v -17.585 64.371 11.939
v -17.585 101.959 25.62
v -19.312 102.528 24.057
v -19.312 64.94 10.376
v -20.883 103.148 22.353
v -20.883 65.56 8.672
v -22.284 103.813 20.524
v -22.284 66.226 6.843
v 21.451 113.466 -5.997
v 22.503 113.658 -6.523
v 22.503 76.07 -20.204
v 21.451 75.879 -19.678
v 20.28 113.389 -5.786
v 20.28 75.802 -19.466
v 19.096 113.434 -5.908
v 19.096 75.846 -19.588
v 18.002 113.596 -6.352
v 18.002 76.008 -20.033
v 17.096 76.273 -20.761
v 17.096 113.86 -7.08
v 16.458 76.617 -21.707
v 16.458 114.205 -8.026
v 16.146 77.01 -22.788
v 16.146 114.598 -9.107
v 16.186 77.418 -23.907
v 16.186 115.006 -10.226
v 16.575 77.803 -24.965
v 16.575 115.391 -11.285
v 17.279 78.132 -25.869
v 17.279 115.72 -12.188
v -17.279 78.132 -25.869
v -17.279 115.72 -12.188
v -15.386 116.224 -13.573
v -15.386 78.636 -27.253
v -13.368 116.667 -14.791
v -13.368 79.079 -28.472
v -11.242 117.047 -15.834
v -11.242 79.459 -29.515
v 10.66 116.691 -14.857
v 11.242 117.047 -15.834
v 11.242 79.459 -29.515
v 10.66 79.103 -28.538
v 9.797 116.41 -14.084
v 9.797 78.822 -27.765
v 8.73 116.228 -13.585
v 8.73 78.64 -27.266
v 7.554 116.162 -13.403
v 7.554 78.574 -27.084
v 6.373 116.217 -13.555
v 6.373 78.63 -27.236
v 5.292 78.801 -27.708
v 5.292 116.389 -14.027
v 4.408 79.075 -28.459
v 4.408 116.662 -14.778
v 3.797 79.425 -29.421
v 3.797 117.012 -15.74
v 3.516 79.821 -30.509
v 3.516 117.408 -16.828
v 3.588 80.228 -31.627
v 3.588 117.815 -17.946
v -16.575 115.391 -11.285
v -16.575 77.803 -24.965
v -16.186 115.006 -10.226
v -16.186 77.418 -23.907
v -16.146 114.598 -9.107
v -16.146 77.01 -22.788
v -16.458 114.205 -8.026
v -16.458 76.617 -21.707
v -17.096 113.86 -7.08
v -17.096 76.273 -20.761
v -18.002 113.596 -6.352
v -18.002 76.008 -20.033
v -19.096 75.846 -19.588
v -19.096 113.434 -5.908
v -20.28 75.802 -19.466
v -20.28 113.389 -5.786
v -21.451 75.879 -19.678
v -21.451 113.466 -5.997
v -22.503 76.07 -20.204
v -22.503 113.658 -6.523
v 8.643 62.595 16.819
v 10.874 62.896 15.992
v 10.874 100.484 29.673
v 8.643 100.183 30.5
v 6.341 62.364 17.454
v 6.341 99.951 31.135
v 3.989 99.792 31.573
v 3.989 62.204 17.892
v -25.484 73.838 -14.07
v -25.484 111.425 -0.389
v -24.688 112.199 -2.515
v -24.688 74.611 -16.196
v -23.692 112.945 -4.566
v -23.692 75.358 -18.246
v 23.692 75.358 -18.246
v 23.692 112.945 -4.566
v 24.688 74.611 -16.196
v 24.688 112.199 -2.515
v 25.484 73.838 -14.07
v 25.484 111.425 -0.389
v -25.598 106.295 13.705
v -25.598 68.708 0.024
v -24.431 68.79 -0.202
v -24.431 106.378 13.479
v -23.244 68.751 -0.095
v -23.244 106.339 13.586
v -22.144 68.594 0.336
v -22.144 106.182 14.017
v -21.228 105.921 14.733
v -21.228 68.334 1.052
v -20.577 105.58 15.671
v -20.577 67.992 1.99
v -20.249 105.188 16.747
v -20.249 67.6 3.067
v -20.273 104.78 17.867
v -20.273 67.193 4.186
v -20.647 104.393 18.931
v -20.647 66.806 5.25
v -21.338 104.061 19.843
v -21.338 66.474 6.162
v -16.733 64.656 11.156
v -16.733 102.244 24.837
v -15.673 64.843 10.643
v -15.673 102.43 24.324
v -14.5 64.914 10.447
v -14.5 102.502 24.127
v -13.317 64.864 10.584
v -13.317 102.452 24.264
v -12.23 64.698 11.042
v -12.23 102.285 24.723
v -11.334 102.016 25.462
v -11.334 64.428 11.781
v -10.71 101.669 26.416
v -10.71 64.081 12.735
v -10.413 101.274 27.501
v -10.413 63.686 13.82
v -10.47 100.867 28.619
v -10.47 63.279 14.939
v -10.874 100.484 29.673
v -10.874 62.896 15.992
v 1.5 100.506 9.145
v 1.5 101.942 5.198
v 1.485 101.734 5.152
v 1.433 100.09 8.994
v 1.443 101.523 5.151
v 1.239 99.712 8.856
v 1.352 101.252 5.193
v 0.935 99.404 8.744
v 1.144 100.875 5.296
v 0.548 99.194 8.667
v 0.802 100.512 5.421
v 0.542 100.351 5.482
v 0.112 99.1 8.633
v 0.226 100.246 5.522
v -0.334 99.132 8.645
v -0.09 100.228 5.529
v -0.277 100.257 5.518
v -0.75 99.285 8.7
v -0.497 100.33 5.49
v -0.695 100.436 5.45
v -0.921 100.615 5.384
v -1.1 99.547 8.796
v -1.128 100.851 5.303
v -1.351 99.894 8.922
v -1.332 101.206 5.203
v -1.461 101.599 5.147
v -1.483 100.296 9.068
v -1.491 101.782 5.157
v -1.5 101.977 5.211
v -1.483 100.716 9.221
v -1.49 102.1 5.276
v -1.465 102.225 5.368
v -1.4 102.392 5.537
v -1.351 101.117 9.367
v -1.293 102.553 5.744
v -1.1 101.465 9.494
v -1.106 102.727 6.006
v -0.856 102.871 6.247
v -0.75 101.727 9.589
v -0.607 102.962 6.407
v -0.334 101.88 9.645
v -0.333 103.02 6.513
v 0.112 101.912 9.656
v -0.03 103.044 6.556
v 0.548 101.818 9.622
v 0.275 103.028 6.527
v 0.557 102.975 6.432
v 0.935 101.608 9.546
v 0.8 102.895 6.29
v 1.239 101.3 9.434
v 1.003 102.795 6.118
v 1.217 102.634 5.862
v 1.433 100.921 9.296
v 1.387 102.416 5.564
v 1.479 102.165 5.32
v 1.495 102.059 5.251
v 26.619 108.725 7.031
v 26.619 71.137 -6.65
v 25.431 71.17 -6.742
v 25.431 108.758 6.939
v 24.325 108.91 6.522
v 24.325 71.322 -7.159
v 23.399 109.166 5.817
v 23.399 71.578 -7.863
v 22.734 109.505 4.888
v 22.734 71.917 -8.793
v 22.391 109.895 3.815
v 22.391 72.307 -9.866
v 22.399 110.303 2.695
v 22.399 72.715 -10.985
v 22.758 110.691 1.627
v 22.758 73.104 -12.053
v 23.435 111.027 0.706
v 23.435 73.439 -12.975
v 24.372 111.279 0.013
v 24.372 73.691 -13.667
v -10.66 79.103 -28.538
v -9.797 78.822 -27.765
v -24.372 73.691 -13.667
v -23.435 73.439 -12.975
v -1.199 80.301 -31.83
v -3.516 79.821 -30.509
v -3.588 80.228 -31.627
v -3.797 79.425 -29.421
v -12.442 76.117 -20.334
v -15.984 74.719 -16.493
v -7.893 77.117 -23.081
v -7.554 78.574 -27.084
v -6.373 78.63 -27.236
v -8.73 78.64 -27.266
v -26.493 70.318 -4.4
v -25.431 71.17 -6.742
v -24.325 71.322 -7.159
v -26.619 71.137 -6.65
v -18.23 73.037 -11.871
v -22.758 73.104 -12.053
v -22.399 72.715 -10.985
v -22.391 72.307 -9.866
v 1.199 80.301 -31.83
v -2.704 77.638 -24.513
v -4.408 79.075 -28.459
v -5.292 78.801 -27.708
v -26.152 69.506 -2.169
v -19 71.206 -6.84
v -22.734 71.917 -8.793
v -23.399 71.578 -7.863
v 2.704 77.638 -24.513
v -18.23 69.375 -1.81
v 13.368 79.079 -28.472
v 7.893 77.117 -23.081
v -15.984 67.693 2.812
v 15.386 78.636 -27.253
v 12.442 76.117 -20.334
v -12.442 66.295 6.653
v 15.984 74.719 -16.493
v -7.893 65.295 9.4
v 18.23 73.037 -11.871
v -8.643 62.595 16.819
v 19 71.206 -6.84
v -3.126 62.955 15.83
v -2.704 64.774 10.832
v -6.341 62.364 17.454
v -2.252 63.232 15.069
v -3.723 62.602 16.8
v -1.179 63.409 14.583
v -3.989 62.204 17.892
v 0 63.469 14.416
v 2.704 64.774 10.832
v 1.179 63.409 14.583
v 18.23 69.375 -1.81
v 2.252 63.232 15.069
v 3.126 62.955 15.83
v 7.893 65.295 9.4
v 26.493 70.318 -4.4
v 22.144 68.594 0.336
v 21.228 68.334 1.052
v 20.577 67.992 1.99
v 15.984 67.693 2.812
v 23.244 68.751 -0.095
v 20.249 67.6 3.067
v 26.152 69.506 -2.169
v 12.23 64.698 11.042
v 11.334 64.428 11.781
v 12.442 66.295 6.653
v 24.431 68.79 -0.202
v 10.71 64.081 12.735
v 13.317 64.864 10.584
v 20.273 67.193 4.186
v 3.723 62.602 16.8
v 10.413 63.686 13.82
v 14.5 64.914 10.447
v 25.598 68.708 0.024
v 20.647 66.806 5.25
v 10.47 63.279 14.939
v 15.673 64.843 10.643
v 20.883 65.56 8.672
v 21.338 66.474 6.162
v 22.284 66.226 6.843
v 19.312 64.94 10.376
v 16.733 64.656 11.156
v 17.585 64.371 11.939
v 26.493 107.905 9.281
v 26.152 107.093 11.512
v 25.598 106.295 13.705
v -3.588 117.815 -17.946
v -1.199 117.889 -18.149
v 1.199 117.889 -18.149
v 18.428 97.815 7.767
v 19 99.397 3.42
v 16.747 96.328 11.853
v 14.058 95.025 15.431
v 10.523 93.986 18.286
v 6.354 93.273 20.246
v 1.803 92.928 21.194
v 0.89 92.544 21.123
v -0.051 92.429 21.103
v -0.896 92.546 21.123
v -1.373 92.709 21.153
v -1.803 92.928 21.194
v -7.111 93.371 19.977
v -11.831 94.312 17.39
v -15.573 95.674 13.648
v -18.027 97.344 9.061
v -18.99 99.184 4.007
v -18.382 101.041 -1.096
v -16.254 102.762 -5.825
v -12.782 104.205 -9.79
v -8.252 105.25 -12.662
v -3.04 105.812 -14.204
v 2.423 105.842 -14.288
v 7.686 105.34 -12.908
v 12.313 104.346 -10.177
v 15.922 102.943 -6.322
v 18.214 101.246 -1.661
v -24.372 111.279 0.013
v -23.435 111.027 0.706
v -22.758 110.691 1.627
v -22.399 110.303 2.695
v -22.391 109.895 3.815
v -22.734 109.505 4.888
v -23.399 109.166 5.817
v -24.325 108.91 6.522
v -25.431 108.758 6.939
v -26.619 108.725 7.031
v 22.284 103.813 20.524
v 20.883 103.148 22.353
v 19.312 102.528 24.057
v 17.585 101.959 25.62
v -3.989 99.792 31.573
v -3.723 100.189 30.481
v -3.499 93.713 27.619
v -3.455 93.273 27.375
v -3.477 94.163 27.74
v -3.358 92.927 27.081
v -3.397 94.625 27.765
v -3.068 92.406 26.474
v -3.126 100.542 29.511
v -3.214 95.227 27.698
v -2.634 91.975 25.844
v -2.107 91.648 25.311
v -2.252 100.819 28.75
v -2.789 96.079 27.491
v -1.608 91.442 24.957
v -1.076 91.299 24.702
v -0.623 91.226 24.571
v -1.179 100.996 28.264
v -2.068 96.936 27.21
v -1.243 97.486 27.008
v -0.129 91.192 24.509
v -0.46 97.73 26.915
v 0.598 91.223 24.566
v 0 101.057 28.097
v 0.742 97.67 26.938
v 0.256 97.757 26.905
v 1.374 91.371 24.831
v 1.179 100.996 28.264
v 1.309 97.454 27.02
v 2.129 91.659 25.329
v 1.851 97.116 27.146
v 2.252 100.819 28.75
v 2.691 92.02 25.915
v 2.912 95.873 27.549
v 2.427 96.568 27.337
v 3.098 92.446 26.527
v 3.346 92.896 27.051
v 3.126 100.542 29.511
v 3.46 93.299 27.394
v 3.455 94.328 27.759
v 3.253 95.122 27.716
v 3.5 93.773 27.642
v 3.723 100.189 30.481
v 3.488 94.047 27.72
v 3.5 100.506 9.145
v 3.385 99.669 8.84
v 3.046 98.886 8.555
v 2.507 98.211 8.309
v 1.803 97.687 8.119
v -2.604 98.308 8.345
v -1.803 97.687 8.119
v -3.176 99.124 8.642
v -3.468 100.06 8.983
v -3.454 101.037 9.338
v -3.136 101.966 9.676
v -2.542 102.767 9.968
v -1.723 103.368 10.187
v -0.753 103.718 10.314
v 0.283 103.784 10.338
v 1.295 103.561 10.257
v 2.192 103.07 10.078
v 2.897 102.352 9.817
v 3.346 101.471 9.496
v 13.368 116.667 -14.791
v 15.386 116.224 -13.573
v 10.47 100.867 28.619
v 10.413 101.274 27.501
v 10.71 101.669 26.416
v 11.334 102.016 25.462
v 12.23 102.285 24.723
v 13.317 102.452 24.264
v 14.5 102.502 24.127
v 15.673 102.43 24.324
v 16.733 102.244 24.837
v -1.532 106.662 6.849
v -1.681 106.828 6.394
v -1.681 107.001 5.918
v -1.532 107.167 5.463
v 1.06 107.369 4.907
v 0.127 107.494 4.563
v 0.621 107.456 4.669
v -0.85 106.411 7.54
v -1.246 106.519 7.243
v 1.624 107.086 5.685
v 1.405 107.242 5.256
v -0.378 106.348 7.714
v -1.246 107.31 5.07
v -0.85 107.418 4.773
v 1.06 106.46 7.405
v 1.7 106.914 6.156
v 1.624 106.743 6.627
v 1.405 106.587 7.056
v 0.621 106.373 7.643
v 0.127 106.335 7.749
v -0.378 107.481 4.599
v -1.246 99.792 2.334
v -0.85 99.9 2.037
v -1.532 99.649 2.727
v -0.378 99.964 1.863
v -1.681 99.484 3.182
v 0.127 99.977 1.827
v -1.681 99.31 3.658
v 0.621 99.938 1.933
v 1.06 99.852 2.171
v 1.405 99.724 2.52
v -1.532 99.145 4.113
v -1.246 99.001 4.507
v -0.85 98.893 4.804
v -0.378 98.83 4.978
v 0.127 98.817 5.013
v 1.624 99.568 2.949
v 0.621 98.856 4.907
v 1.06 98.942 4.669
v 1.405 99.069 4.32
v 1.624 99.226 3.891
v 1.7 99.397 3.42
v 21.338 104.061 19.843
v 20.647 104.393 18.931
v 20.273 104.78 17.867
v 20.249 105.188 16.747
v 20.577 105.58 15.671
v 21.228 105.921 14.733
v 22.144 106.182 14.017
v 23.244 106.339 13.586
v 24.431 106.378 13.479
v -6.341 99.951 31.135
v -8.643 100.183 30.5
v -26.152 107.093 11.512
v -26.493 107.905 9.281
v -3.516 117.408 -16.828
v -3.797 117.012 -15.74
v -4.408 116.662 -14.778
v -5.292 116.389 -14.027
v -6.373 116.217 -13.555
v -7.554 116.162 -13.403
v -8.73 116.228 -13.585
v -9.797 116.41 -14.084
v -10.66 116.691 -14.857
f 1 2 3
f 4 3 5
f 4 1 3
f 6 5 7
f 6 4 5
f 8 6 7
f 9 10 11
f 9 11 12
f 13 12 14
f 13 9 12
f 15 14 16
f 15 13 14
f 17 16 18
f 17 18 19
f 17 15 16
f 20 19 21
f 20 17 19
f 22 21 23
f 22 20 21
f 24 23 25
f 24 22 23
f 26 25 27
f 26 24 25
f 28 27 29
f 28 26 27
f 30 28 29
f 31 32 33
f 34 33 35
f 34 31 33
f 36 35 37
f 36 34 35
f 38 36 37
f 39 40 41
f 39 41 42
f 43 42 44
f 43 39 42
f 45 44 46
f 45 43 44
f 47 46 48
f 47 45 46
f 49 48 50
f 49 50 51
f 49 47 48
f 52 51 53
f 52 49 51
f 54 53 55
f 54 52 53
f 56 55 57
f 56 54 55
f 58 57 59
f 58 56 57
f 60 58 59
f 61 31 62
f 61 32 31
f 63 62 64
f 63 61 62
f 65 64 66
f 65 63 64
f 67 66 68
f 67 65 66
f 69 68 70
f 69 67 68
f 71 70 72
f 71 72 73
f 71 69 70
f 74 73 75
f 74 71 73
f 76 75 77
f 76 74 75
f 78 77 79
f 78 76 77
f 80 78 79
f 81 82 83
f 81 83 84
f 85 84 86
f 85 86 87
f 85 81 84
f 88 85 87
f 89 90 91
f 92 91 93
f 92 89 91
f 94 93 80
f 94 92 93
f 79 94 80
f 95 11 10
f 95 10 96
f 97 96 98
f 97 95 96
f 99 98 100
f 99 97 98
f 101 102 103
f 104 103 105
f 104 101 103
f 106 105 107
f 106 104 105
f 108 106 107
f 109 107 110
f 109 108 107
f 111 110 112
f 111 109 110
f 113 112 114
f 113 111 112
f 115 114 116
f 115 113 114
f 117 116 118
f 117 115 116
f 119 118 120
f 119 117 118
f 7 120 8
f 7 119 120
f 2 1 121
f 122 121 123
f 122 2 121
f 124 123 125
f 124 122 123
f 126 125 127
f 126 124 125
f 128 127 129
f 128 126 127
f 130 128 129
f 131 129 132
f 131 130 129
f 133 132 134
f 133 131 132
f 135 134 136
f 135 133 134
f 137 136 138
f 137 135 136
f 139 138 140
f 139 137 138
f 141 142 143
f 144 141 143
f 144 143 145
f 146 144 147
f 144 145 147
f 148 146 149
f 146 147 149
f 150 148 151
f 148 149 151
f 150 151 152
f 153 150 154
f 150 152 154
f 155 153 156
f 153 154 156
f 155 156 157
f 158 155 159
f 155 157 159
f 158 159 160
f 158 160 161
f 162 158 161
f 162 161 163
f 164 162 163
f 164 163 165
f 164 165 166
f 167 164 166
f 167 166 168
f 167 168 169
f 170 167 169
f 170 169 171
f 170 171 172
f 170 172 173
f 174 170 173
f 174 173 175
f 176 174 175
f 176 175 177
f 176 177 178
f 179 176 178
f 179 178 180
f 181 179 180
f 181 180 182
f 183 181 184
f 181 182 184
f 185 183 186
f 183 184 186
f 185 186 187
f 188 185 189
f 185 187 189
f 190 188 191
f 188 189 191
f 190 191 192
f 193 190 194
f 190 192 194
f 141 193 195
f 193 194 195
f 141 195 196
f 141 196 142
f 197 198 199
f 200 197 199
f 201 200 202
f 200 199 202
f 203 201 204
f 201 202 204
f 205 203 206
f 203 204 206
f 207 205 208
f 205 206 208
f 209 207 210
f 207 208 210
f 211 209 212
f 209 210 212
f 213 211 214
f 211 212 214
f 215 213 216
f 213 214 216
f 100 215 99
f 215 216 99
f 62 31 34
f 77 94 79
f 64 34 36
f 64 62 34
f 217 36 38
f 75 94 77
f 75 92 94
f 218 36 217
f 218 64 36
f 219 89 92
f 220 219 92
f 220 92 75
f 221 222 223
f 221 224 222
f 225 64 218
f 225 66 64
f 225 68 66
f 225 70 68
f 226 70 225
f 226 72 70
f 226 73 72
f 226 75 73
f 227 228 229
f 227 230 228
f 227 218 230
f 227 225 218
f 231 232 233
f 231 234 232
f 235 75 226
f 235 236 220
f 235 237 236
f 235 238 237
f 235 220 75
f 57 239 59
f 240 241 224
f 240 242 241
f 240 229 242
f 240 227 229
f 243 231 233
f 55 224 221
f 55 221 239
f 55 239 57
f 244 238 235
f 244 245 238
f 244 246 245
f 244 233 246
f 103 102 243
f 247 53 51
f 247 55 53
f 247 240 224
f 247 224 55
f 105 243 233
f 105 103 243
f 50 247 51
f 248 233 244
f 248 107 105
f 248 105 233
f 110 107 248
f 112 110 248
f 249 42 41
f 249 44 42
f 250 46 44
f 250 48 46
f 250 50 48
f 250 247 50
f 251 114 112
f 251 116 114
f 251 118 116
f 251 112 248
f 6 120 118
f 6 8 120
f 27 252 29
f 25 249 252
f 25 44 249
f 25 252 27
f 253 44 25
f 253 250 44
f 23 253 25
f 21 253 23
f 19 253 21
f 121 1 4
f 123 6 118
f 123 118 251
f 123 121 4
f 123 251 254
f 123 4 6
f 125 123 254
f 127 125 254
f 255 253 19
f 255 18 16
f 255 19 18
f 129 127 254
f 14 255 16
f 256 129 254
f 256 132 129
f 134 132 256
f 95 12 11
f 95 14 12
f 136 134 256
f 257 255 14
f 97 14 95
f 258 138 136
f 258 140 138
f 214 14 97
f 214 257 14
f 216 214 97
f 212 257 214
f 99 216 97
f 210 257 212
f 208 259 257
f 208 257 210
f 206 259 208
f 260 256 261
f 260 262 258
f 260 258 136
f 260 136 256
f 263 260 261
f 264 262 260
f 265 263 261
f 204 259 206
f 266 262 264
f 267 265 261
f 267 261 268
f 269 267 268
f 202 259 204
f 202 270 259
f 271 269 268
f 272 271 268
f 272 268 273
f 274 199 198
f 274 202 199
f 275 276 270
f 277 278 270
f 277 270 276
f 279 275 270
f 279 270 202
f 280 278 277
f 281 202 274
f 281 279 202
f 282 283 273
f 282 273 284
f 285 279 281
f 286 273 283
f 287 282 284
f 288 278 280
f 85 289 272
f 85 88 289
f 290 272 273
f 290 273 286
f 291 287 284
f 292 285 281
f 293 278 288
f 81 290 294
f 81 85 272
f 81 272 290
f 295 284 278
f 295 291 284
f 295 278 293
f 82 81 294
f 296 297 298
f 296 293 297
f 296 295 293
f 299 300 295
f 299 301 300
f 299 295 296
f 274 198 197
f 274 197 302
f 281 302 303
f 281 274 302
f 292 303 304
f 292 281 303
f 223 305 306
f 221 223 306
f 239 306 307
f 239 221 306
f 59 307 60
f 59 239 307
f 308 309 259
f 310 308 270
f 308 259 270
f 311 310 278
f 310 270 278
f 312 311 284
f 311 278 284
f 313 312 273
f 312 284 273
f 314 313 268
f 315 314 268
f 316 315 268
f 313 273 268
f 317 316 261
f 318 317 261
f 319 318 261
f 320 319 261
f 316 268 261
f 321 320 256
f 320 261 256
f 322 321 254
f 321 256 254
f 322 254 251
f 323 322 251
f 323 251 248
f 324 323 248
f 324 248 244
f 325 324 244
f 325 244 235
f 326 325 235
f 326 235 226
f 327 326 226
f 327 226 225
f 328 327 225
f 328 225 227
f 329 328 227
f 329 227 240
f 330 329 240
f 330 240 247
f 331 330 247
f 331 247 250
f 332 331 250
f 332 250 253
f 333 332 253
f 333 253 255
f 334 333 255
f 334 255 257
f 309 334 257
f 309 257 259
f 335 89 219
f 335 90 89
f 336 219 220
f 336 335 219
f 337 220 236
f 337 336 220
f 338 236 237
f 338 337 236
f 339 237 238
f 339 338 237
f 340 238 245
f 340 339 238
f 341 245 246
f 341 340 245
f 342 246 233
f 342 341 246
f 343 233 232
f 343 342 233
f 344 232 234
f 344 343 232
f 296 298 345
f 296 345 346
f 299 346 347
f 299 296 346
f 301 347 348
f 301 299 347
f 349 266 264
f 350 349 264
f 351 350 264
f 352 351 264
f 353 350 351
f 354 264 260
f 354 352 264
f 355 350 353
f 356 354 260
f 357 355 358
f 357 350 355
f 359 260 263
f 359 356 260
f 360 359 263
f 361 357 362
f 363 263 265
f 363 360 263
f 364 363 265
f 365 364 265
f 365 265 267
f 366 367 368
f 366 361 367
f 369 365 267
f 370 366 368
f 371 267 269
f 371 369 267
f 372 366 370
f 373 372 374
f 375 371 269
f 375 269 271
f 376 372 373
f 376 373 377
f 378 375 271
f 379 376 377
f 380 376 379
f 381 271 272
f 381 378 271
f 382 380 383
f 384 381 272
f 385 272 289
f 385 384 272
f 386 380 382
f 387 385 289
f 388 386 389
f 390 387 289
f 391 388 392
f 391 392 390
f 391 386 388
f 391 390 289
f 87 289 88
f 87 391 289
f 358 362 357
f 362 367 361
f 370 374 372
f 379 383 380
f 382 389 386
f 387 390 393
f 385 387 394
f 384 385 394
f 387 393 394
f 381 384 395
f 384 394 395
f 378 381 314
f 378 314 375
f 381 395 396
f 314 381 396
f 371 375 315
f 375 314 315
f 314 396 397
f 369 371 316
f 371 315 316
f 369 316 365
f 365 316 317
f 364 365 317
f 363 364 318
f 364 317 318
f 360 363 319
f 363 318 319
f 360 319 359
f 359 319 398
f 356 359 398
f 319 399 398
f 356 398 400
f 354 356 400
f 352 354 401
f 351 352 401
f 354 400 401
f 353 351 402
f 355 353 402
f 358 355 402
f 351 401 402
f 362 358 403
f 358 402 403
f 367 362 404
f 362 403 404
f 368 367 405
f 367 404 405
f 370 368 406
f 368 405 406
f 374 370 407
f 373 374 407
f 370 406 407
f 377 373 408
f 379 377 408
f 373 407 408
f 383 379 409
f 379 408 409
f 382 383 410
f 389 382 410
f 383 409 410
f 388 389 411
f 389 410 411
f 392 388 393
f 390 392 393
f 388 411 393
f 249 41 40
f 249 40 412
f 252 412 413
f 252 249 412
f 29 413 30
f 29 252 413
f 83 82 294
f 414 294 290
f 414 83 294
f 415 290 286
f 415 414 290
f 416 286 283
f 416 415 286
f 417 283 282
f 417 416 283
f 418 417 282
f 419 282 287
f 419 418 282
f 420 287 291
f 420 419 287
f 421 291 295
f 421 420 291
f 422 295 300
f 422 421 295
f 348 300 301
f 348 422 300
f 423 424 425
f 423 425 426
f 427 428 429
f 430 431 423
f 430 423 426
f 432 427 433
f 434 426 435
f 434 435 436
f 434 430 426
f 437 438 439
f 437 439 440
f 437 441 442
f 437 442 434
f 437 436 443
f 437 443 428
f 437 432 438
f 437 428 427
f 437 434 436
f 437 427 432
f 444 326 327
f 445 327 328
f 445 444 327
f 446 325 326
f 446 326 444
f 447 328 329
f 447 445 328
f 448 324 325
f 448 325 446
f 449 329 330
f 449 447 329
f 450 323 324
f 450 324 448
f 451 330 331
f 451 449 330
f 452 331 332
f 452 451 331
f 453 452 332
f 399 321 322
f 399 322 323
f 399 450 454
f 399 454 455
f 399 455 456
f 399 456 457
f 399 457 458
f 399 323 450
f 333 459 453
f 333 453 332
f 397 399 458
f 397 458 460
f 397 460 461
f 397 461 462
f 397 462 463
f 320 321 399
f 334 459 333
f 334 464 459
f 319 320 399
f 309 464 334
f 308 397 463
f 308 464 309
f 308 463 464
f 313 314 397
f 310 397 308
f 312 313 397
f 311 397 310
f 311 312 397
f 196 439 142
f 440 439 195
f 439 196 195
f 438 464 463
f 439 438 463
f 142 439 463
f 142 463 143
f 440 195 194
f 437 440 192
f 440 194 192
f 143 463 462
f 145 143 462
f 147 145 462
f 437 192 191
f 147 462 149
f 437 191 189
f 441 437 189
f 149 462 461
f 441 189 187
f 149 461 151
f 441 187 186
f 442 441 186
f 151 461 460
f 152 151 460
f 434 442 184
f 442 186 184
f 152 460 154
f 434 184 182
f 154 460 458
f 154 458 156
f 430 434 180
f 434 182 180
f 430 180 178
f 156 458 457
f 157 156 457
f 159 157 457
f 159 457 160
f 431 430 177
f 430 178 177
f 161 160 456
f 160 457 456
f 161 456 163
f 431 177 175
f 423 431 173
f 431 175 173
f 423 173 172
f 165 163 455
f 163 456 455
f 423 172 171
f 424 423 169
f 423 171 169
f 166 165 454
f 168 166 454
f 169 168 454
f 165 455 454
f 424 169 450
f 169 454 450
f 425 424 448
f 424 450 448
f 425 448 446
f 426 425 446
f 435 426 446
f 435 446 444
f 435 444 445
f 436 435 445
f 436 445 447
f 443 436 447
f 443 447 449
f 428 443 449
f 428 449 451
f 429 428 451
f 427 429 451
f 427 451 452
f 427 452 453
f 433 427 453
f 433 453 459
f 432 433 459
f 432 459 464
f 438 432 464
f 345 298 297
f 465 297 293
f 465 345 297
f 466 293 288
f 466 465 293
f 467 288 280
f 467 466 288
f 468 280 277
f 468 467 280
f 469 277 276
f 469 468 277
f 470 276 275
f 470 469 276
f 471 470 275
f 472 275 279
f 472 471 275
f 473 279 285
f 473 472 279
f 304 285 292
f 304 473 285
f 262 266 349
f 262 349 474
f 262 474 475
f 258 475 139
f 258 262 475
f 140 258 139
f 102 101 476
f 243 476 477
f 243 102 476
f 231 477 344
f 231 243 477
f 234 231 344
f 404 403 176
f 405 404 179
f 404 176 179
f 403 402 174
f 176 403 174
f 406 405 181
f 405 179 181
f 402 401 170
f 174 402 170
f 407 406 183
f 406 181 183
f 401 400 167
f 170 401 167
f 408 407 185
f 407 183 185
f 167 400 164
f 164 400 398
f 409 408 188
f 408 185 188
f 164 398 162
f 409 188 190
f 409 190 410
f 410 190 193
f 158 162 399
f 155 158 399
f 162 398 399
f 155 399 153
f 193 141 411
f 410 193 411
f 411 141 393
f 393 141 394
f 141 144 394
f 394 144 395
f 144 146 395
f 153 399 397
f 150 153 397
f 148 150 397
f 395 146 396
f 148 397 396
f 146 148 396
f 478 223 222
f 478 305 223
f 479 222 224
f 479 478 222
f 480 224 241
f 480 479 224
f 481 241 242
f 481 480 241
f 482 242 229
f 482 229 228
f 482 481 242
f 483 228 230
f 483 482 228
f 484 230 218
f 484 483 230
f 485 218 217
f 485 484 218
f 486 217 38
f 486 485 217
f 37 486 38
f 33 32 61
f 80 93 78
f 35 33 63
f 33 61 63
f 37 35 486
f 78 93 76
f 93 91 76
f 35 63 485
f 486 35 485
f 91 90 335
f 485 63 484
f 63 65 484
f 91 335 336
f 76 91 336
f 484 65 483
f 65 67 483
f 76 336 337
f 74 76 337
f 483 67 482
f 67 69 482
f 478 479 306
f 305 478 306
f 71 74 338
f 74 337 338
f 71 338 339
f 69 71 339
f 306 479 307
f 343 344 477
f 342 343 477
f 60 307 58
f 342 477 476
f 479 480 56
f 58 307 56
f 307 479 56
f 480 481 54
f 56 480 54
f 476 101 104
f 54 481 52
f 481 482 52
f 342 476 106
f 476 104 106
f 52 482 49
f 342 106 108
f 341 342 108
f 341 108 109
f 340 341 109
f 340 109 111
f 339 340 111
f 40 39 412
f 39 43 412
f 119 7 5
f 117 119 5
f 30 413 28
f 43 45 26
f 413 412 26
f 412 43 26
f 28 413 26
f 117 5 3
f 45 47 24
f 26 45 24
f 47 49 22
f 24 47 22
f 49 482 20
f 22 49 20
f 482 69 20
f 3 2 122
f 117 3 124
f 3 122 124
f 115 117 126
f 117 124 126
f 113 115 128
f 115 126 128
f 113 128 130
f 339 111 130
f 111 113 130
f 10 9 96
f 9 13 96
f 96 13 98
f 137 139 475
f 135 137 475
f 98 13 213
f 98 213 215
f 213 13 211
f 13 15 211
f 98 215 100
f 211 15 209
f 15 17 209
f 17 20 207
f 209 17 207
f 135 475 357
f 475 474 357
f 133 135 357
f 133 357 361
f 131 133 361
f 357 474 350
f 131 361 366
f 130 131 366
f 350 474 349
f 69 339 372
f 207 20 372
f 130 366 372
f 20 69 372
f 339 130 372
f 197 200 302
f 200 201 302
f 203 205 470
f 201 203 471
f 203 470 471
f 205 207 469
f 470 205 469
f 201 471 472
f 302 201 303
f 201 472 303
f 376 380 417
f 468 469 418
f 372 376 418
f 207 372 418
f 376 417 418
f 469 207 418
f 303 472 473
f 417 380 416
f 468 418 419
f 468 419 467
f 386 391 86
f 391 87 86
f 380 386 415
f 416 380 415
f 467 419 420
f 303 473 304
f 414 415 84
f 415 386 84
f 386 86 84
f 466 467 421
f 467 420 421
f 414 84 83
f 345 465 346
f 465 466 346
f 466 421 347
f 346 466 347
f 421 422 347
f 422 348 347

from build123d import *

# Parameters (mm, degrees)
CYLINDER003_R          = 1.7
CYLINDER003_DEPTH      = 18
CYLINDER003_ROLL_ANGLE = 90.0000000001
CYLINDER002_R          = 3.5
CYLINDER002_DEPTH      = 35
CYLINDER004_R          = 1.5
CYLINDER004_DEPTH      = 40
SKETCH_R               = 4
PAD_DEPTH              = 20
CYLINDER001_R          = 19
CYLINDER001_DEPTH      = 30
CYLINDER001_ROLL_ANGLE = 90.0000000001
CYLINDER_R             = 26.62
CYLINDER_DEPTH         = 40
CYLINDER_ROLL_ANGLE    = 90.0000000001
CUT002_ROLL_ANGLE      = -20


with BuildPart() as cilindro003:
    # Cylinder003 → Cylinder003 (new body)
    with BuildSketch(Plane.XY):
        Circle(CYLINDER003_R)
    extrude(amount=CYLINDER003_DEPTH)


with BuildPart() as cilindro003_1:
    # Cylinder003 roll: moved
    add(cilindro003.part.rotate(Axis((0, 0, 0), (1, 0, 0)), CYLINDER003_ROLL_ANGLE))


with BuildPart() as cilindro003_2:
    # Cylinder003 placement: moved
    add(cilindro003_1.part)


with BuildPart() as cilindro002:
    # Cylinder002 → Cylinder002 (new body)
    with BuildSketch(Plane(origin=(0, -13, 5), x_dir=(1, 0, 0), z_dir=(0, 0, 1))):
        Circle(CYLINDER002_R)
    extrude(amount=CYLINDER002_DEPTH)


with BuildPart() as fusion001:
    # Cylinder004 → Cylinder004 (new body)
    with BuildSketch(Plane(origin=(0, -13, 0), x_dir=(1, 0, 0), z_dir=(0, 0, 1))):
        Circle(CYLINDER004_R)
    extrude(amount=CYLINDER004_DEPTH)

    # Fusion001: union Cilindro003, Cilindro002
    add(cilindro003_2.part)
    add(cilindro002.part)


with BuildPart() as pad:
    # Sketch → Pad (new body, symmetric)
    with BuildSketch(Plane.XZ):
        with Locations((0, 26.6209914966)):
            Circle(SKETCH_R)
        with Locations((14.3923946042, 22.395003144)):
            Circle(SKETCH_R)
        with Locations((24.2153056134, 11.0587595287)):
            Circle(SKETCH_R)
        with Locations((26.3500281875, -3.7885620995)):
            Circle(SKETCH_R)
        with Locations((20.1188029925, -17.4330420298)):
            Circle(SKETCH_R)
        with Locations((7.5, -25.5426542917)):
            Circle(SKETCH_R)
        with Locations((-7.5, -25.5426542917)):
            Circle(SKETCH_R)
        with Locations((-26.3500281875, -3.7885620995)):
            Circle(SKETCH_R)
        with Locations((-24.2153056134, 11.0587595287)):
            Circle(SKETCH_R)
        with Locations((-14.3923946042, 22.395003144)):
            Circle(SKETCH_R)
        with Locations((-20.1188029925, -17.4330420298)):
            Circle(SKETCH_R)
    extrude(amount=PAD_DEPTH, both=True)


with BuildPart() as cilindro001:
    # Cylinder001 → Cylinder001 (new body)
    with BuildSketch(Plane.XY):
        Circle(CYLINDER001_R)
    extrude(amount=CYLINDER001_DEPTH)


with BuildPart() as cilindro001_1:
    # Cylinder001 roll: moved
    add(cilindro001.part.rotate(Axis((0, 0, 0), (1, 0, 0)), CYLINDER001_ROLL_ANGLE))


with BuildPart() as cilindro001_2:
    # Cylinder001 placement: moved
    add(cilindro001_1.part.moved(Location((0, 20, 0))))


with BuildPart() as cut002:
    # Cylinder → Cylinder (new body)
    with BuildSketch(Plane.XY):
        Circle(CYLINDER_R)
    extrude(amount=CYLINDER_DEPTH)


with BuildPart() as cut002_1:
    # Cylinder roll: moved
    add(cut002.part.rotate(Axis((0, 0, 0), (1, 0, 0)), CYLINDER_ROLL_ANGLE))


with BuildPart() as cut002_2:
    # Cylinder placement: moved
    add(cut002_1.part.moved(Location((0, 20, 0))))

    # Cut: cut Cilindro001
    add(cilindro001_2.part, mode=Mode.SUBTRACT)

    # Cut001: cut Pad
    add(pad.part, mode=Mode.SUBTRACT)

    # Cut002: cut Fusion001
    add(fusion001.part, mode=Mode.SUBTRACT)


with BuildPart() as cut002_3:
    # Cut002 roll: moved
    add(cut002_2.part.rotate(Axis((0, 0, 0), (1, 0, 0)), CUT002_ROLL_ANGLE))


with BuildPart() as cut002_4:
    # Cut002 placement: moved
    add(cut002_3.part)


with BuildPart() as part_mirroring008:
    # Part__Mirroring008: instance of Cut002
    add(cut002_4.part.mirror(Plane(origin=(0, 45, 0), x_dir=(1, 0, 0), z_dir=(0, 1, 0))))


solid = part_mirroring008.part
